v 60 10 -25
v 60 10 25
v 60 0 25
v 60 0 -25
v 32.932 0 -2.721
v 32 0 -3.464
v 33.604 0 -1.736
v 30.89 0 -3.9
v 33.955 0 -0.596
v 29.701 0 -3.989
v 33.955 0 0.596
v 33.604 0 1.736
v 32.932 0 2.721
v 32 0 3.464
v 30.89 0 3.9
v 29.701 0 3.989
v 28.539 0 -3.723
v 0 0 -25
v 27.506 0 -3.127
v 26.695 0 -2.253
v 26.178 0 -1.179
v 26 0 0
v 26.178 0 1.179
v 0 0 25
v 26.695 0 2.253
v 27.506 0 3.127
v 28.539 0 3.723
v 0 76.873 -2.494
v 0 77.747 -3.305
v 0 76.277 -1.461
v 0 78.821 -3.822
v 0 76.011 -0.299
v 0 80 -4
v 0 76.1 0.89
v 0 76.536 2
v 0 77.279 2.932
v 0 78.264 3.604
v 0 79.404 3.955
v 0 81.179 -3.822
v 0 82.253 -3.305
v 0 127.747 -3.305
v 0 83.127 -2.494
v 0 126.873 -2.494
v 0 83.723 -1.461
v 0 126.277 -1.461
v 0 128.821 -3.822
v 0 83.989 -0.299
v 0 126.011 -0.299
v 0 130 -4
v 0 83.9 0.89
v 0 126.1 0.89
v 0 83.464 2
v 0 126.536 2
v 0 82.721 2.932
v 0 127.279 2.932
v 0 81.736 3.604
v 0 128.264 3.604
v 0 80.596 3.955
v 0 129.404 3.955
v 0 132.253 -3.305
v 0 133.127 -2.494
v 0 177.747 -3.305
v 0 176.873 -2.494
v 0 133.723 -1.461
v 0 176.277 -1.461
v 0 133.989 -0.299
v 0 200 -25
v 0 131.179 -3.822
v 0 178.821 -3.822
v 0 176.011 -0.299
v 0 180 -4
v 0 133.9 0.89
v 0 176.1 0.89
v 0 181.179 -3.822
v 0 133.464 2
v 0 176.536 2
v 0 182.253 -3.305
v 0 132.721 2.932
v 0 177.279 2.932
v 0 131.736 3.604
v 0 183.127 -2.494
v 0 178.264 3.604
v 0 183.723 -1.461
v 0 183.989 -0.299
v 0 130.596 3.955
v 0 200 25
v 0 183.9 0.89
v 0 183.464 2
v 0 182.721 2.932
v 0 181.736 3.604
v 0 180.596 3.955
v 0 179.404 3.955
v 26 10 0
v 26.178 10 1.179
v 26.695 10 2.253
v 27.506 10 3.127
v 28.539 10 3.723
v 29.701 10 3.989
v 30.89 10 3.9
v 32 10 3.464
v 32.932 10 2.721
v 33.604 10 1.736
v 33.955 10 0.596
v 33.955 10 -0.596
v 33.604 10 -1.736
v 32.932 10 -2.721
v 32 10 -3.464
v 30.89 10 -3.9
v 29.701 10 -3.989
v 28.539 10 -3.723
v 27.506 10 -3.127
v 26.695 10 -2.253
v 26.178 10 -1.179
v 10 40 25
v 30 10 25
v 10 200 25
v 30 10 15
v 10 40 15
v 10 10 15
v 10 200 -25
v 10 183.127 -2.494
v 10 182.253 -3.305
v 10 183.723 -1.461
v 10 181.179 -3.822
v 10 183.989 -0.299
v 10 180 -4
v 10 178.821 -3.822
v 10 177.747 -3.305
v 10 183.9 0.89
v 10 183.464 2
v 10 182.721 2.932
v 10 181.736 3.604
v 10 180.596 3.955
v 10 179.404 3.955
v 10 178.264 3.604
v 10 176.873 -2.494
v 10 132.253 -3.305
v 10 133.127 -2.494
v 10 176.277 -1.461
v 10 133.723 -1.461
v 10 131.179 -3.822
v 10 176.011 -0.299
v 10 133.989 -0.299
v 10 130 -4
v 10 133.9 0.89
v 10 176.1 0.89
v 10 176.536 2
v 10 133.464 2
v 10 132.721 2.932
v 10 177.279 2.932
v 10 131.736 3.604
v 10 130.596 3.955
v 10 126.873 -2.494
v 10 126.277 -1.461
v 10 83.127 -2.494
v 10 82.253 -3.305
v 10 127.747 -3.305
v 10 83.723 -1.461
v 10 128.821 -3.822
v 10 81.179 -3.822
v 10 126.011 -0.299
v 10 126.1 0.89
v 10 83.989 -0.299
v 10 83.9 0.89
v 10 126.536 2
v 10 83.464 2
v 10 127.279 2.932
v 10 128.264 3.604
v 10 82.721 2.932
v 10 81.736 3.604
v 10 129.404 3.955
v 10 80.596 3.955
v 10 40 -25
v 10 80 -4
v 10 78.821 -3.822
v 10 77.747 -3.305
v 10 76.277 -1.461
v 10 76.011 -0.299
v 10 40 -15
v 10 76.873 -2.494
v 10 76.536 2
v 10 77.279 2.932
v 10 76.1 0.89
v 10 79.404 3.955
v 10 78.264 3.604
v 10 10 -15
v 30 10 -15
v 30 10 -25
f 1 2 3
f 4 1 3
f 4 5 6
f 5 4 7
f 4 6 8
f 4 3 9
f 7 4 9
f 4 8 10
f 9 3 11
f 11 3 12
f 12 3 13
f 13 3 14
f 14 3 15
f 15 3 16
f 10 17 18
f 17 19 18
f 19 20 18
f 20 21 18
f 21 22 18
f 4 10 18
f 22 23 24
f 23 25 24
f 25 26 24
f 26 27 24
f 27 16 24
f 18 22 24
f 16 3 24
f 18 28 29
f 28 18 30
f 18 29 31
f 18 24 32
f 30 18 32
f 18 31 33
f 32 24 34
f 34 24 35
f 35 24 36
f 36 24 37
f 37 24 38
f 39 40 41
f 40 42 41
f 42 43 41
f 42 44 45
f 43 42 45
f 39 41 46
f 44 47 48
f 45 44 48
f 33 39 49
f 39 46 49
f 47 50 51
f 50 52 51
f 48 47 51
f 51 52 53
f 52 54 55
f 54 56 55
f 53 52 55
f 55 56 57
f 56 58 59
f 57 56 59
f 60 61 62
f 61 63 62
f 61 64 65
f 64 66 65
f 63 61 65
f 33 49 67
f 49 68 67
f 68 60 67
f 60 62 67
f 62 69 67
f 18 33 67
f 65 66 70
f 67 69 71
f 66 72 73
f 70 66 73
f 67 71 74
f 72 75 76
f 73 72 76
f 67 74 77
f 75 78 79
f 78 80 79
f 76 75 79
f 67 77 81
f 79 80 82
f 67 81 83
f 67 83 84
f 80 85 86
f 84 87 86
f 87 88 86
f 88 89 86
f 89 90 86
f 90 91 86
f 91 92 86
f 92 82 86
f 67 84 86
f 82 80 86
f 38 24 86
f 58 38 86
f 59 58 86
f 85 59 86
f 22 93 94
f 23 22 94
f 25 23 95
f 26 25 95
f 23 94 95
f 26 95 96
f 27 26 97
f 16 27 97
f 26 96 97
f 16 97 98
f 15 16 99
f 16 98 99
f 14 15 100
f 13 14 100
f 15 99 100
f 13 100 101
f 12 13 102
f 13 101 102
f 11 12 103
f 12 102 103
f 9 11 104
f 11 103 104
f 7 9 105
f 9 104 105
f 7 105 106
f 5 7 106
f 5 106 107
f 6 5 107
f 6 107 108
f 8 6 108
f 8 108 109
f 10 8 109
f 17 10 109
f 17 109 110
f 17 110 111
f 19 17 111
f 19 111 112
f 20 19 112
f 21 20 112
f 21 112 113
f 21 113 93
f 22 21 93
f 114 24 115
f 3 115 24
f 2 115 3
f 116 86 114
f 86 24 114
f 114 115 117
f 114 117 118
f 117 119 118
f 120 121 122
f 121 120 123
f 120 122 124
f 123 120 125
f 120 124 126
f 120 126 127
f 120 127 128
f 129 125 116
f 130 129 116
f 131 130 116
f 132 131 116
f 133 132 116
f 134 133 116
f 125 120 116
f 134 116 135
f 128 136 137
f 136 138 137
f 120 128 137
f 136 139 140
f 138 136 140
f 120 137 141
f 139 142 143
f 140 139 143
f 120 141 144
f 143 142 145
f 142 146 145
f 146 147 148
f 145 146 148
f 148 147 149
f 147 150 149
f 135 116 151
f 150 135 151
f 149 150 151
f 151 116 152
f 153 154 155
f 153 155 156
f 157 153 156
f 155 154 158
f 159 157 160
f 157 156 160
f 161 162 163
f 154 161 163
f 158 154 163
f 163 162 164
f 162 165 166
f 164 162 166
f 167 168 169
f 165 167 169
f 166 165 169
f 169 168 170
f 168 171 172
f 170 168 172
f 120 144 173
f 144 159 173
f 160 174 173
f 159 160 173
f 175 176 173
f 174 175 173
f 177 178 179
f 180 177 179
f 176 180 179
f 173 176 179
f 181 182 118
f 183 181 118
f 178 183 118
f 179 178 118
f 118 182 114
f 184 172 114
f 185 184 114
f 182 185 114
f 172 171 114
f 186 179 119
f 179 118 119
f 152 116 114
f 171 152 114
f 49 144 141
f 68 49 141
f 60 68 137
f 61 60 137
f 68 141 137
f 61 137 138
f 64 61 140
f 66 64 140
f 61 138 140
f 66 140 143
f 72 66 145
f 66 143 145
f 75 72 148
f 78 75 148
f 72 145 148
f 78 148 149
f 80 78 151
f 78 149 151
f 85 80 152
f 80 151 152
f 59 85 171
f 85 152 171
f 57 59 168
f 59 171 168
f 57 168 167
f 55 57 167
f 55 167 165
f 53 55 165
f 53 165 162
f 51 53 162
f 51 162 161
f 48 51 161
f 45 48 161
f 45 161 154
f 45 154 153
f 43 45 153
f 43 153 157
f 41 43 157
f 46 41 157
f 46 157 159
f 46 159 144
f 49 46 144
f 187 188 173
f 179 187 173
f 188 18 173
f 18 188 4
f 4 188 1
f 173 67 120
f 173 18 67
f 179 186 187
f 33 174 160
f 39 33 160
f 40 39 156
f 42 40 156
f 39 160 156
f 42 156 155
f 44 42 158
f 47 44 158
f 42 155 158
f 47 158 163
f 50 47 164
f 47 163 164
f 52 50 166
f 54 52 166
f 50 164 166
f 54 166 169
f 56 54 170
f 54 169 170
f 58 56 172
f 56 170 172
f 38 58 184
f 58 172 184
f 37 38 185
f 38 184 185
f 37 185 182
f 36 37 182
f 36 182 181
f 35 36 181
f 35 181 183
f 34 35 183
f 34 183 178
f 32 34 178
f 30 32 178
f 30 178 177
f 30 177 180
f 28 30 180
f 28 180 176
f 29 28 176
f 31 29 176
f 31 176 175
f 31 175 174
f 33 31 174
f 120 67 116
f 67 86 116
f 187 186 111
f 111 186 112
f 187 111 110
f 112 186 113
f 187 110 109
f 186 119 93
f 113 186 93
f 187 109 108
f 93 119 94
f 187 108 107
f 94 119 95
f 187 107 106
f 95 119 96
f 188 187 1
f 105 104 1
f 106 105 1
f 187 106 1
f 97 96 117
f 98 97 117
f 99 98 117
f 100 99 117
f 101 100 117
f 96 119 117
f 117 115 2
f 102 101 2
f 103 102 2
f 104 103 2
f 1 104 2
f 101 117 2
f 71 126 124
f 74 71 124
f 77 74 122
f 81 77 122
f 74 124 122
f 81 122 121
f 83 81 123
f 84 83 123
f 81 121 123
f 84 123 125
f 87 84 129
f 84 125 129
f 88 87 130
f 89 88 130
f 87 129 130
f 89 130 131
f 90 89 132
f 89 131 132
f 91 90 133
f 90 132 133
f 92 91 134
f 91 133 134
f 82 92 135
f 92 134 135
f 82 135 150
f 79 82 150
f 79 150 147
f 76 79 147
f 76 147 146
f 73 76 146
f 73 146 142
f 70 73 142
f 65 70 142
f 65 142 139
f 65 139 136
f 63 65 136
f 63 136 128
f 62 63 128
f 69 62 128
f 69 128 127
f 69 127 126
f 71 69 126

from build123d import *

# Parameters (mm, degrees)
BOSS_EXTRUDE1_DEPTH = 25
SKETCH2_R           = 4
CUT_EXTRUDE1_DEPTH  = 201.81085628
SKETCH3_R           = 4
CUT_EXTRUDE2_DEPTH  = 208.665596573
BOSS_EXTRUDE2_DEPTH = 10


with BuildPart() as part:
    # Sketch1 → Boss-Extrude1 (new, symmetric)
    with BuildSketch(Plane.XY):
        Polygon((0, 0), (0, 200), (10, 200), (10, 10), (60, 10), (60, 0), align=None)
    extrude(amount=BOSS_EXTRUDE1_DEPTH, both=True)

    # Sketch2 → Cut-Extrude1 (cut, through all)
    with BuildSketch(Plane(origin=(0, 10, 0), x_dir=(1, 0, 0), z_dir=(0, 1, 0))):
        with Locations(Location((30, 0, 0), (0, 0, 180))):
            Circle(SKETCH2_R)
    extrude(amount=-CUT_EXTRUDE1_DEPTH, mode=Mode.SUBTRACT)

    # Sketch3 → Cut-Extrude2 (cut, through all)
    with BuildSketch(Plane(origin=(10, 0, 0), x_dir=(0, 0, -1), z_dir=(1, 0, 0))):
        with Locations((0, 180)):
            Circle(SKETCH3_R)
        with Locations((0, 130)):
            Circle(SKETCH3_R)
        with Locations((0, 80)):
            Circle(SKETCH3_R)
    extrude(amount=-CUT_EXTRUDE2_DEPTH, mode=Mode.SUBTRACT)

    # Sketch5 → Boss-Extrude2 (add)
    with BuildSketch(Plane.XY.offset(25)):
        Polygon((10, 10), (30, 10), (10, 40), align=None)
    boss_extrude2 = extrude(amount=-BOSS_EXTRUDE2_DEPTH)

    # Mirror1: Boss-Extrude2 across plane
    add(boss_extrude2.mirror(Plane(origin=(0, 0, 0), x_dir=(1, 0, 0), z_dir=(0, 0, -1))))


solid = part.part
